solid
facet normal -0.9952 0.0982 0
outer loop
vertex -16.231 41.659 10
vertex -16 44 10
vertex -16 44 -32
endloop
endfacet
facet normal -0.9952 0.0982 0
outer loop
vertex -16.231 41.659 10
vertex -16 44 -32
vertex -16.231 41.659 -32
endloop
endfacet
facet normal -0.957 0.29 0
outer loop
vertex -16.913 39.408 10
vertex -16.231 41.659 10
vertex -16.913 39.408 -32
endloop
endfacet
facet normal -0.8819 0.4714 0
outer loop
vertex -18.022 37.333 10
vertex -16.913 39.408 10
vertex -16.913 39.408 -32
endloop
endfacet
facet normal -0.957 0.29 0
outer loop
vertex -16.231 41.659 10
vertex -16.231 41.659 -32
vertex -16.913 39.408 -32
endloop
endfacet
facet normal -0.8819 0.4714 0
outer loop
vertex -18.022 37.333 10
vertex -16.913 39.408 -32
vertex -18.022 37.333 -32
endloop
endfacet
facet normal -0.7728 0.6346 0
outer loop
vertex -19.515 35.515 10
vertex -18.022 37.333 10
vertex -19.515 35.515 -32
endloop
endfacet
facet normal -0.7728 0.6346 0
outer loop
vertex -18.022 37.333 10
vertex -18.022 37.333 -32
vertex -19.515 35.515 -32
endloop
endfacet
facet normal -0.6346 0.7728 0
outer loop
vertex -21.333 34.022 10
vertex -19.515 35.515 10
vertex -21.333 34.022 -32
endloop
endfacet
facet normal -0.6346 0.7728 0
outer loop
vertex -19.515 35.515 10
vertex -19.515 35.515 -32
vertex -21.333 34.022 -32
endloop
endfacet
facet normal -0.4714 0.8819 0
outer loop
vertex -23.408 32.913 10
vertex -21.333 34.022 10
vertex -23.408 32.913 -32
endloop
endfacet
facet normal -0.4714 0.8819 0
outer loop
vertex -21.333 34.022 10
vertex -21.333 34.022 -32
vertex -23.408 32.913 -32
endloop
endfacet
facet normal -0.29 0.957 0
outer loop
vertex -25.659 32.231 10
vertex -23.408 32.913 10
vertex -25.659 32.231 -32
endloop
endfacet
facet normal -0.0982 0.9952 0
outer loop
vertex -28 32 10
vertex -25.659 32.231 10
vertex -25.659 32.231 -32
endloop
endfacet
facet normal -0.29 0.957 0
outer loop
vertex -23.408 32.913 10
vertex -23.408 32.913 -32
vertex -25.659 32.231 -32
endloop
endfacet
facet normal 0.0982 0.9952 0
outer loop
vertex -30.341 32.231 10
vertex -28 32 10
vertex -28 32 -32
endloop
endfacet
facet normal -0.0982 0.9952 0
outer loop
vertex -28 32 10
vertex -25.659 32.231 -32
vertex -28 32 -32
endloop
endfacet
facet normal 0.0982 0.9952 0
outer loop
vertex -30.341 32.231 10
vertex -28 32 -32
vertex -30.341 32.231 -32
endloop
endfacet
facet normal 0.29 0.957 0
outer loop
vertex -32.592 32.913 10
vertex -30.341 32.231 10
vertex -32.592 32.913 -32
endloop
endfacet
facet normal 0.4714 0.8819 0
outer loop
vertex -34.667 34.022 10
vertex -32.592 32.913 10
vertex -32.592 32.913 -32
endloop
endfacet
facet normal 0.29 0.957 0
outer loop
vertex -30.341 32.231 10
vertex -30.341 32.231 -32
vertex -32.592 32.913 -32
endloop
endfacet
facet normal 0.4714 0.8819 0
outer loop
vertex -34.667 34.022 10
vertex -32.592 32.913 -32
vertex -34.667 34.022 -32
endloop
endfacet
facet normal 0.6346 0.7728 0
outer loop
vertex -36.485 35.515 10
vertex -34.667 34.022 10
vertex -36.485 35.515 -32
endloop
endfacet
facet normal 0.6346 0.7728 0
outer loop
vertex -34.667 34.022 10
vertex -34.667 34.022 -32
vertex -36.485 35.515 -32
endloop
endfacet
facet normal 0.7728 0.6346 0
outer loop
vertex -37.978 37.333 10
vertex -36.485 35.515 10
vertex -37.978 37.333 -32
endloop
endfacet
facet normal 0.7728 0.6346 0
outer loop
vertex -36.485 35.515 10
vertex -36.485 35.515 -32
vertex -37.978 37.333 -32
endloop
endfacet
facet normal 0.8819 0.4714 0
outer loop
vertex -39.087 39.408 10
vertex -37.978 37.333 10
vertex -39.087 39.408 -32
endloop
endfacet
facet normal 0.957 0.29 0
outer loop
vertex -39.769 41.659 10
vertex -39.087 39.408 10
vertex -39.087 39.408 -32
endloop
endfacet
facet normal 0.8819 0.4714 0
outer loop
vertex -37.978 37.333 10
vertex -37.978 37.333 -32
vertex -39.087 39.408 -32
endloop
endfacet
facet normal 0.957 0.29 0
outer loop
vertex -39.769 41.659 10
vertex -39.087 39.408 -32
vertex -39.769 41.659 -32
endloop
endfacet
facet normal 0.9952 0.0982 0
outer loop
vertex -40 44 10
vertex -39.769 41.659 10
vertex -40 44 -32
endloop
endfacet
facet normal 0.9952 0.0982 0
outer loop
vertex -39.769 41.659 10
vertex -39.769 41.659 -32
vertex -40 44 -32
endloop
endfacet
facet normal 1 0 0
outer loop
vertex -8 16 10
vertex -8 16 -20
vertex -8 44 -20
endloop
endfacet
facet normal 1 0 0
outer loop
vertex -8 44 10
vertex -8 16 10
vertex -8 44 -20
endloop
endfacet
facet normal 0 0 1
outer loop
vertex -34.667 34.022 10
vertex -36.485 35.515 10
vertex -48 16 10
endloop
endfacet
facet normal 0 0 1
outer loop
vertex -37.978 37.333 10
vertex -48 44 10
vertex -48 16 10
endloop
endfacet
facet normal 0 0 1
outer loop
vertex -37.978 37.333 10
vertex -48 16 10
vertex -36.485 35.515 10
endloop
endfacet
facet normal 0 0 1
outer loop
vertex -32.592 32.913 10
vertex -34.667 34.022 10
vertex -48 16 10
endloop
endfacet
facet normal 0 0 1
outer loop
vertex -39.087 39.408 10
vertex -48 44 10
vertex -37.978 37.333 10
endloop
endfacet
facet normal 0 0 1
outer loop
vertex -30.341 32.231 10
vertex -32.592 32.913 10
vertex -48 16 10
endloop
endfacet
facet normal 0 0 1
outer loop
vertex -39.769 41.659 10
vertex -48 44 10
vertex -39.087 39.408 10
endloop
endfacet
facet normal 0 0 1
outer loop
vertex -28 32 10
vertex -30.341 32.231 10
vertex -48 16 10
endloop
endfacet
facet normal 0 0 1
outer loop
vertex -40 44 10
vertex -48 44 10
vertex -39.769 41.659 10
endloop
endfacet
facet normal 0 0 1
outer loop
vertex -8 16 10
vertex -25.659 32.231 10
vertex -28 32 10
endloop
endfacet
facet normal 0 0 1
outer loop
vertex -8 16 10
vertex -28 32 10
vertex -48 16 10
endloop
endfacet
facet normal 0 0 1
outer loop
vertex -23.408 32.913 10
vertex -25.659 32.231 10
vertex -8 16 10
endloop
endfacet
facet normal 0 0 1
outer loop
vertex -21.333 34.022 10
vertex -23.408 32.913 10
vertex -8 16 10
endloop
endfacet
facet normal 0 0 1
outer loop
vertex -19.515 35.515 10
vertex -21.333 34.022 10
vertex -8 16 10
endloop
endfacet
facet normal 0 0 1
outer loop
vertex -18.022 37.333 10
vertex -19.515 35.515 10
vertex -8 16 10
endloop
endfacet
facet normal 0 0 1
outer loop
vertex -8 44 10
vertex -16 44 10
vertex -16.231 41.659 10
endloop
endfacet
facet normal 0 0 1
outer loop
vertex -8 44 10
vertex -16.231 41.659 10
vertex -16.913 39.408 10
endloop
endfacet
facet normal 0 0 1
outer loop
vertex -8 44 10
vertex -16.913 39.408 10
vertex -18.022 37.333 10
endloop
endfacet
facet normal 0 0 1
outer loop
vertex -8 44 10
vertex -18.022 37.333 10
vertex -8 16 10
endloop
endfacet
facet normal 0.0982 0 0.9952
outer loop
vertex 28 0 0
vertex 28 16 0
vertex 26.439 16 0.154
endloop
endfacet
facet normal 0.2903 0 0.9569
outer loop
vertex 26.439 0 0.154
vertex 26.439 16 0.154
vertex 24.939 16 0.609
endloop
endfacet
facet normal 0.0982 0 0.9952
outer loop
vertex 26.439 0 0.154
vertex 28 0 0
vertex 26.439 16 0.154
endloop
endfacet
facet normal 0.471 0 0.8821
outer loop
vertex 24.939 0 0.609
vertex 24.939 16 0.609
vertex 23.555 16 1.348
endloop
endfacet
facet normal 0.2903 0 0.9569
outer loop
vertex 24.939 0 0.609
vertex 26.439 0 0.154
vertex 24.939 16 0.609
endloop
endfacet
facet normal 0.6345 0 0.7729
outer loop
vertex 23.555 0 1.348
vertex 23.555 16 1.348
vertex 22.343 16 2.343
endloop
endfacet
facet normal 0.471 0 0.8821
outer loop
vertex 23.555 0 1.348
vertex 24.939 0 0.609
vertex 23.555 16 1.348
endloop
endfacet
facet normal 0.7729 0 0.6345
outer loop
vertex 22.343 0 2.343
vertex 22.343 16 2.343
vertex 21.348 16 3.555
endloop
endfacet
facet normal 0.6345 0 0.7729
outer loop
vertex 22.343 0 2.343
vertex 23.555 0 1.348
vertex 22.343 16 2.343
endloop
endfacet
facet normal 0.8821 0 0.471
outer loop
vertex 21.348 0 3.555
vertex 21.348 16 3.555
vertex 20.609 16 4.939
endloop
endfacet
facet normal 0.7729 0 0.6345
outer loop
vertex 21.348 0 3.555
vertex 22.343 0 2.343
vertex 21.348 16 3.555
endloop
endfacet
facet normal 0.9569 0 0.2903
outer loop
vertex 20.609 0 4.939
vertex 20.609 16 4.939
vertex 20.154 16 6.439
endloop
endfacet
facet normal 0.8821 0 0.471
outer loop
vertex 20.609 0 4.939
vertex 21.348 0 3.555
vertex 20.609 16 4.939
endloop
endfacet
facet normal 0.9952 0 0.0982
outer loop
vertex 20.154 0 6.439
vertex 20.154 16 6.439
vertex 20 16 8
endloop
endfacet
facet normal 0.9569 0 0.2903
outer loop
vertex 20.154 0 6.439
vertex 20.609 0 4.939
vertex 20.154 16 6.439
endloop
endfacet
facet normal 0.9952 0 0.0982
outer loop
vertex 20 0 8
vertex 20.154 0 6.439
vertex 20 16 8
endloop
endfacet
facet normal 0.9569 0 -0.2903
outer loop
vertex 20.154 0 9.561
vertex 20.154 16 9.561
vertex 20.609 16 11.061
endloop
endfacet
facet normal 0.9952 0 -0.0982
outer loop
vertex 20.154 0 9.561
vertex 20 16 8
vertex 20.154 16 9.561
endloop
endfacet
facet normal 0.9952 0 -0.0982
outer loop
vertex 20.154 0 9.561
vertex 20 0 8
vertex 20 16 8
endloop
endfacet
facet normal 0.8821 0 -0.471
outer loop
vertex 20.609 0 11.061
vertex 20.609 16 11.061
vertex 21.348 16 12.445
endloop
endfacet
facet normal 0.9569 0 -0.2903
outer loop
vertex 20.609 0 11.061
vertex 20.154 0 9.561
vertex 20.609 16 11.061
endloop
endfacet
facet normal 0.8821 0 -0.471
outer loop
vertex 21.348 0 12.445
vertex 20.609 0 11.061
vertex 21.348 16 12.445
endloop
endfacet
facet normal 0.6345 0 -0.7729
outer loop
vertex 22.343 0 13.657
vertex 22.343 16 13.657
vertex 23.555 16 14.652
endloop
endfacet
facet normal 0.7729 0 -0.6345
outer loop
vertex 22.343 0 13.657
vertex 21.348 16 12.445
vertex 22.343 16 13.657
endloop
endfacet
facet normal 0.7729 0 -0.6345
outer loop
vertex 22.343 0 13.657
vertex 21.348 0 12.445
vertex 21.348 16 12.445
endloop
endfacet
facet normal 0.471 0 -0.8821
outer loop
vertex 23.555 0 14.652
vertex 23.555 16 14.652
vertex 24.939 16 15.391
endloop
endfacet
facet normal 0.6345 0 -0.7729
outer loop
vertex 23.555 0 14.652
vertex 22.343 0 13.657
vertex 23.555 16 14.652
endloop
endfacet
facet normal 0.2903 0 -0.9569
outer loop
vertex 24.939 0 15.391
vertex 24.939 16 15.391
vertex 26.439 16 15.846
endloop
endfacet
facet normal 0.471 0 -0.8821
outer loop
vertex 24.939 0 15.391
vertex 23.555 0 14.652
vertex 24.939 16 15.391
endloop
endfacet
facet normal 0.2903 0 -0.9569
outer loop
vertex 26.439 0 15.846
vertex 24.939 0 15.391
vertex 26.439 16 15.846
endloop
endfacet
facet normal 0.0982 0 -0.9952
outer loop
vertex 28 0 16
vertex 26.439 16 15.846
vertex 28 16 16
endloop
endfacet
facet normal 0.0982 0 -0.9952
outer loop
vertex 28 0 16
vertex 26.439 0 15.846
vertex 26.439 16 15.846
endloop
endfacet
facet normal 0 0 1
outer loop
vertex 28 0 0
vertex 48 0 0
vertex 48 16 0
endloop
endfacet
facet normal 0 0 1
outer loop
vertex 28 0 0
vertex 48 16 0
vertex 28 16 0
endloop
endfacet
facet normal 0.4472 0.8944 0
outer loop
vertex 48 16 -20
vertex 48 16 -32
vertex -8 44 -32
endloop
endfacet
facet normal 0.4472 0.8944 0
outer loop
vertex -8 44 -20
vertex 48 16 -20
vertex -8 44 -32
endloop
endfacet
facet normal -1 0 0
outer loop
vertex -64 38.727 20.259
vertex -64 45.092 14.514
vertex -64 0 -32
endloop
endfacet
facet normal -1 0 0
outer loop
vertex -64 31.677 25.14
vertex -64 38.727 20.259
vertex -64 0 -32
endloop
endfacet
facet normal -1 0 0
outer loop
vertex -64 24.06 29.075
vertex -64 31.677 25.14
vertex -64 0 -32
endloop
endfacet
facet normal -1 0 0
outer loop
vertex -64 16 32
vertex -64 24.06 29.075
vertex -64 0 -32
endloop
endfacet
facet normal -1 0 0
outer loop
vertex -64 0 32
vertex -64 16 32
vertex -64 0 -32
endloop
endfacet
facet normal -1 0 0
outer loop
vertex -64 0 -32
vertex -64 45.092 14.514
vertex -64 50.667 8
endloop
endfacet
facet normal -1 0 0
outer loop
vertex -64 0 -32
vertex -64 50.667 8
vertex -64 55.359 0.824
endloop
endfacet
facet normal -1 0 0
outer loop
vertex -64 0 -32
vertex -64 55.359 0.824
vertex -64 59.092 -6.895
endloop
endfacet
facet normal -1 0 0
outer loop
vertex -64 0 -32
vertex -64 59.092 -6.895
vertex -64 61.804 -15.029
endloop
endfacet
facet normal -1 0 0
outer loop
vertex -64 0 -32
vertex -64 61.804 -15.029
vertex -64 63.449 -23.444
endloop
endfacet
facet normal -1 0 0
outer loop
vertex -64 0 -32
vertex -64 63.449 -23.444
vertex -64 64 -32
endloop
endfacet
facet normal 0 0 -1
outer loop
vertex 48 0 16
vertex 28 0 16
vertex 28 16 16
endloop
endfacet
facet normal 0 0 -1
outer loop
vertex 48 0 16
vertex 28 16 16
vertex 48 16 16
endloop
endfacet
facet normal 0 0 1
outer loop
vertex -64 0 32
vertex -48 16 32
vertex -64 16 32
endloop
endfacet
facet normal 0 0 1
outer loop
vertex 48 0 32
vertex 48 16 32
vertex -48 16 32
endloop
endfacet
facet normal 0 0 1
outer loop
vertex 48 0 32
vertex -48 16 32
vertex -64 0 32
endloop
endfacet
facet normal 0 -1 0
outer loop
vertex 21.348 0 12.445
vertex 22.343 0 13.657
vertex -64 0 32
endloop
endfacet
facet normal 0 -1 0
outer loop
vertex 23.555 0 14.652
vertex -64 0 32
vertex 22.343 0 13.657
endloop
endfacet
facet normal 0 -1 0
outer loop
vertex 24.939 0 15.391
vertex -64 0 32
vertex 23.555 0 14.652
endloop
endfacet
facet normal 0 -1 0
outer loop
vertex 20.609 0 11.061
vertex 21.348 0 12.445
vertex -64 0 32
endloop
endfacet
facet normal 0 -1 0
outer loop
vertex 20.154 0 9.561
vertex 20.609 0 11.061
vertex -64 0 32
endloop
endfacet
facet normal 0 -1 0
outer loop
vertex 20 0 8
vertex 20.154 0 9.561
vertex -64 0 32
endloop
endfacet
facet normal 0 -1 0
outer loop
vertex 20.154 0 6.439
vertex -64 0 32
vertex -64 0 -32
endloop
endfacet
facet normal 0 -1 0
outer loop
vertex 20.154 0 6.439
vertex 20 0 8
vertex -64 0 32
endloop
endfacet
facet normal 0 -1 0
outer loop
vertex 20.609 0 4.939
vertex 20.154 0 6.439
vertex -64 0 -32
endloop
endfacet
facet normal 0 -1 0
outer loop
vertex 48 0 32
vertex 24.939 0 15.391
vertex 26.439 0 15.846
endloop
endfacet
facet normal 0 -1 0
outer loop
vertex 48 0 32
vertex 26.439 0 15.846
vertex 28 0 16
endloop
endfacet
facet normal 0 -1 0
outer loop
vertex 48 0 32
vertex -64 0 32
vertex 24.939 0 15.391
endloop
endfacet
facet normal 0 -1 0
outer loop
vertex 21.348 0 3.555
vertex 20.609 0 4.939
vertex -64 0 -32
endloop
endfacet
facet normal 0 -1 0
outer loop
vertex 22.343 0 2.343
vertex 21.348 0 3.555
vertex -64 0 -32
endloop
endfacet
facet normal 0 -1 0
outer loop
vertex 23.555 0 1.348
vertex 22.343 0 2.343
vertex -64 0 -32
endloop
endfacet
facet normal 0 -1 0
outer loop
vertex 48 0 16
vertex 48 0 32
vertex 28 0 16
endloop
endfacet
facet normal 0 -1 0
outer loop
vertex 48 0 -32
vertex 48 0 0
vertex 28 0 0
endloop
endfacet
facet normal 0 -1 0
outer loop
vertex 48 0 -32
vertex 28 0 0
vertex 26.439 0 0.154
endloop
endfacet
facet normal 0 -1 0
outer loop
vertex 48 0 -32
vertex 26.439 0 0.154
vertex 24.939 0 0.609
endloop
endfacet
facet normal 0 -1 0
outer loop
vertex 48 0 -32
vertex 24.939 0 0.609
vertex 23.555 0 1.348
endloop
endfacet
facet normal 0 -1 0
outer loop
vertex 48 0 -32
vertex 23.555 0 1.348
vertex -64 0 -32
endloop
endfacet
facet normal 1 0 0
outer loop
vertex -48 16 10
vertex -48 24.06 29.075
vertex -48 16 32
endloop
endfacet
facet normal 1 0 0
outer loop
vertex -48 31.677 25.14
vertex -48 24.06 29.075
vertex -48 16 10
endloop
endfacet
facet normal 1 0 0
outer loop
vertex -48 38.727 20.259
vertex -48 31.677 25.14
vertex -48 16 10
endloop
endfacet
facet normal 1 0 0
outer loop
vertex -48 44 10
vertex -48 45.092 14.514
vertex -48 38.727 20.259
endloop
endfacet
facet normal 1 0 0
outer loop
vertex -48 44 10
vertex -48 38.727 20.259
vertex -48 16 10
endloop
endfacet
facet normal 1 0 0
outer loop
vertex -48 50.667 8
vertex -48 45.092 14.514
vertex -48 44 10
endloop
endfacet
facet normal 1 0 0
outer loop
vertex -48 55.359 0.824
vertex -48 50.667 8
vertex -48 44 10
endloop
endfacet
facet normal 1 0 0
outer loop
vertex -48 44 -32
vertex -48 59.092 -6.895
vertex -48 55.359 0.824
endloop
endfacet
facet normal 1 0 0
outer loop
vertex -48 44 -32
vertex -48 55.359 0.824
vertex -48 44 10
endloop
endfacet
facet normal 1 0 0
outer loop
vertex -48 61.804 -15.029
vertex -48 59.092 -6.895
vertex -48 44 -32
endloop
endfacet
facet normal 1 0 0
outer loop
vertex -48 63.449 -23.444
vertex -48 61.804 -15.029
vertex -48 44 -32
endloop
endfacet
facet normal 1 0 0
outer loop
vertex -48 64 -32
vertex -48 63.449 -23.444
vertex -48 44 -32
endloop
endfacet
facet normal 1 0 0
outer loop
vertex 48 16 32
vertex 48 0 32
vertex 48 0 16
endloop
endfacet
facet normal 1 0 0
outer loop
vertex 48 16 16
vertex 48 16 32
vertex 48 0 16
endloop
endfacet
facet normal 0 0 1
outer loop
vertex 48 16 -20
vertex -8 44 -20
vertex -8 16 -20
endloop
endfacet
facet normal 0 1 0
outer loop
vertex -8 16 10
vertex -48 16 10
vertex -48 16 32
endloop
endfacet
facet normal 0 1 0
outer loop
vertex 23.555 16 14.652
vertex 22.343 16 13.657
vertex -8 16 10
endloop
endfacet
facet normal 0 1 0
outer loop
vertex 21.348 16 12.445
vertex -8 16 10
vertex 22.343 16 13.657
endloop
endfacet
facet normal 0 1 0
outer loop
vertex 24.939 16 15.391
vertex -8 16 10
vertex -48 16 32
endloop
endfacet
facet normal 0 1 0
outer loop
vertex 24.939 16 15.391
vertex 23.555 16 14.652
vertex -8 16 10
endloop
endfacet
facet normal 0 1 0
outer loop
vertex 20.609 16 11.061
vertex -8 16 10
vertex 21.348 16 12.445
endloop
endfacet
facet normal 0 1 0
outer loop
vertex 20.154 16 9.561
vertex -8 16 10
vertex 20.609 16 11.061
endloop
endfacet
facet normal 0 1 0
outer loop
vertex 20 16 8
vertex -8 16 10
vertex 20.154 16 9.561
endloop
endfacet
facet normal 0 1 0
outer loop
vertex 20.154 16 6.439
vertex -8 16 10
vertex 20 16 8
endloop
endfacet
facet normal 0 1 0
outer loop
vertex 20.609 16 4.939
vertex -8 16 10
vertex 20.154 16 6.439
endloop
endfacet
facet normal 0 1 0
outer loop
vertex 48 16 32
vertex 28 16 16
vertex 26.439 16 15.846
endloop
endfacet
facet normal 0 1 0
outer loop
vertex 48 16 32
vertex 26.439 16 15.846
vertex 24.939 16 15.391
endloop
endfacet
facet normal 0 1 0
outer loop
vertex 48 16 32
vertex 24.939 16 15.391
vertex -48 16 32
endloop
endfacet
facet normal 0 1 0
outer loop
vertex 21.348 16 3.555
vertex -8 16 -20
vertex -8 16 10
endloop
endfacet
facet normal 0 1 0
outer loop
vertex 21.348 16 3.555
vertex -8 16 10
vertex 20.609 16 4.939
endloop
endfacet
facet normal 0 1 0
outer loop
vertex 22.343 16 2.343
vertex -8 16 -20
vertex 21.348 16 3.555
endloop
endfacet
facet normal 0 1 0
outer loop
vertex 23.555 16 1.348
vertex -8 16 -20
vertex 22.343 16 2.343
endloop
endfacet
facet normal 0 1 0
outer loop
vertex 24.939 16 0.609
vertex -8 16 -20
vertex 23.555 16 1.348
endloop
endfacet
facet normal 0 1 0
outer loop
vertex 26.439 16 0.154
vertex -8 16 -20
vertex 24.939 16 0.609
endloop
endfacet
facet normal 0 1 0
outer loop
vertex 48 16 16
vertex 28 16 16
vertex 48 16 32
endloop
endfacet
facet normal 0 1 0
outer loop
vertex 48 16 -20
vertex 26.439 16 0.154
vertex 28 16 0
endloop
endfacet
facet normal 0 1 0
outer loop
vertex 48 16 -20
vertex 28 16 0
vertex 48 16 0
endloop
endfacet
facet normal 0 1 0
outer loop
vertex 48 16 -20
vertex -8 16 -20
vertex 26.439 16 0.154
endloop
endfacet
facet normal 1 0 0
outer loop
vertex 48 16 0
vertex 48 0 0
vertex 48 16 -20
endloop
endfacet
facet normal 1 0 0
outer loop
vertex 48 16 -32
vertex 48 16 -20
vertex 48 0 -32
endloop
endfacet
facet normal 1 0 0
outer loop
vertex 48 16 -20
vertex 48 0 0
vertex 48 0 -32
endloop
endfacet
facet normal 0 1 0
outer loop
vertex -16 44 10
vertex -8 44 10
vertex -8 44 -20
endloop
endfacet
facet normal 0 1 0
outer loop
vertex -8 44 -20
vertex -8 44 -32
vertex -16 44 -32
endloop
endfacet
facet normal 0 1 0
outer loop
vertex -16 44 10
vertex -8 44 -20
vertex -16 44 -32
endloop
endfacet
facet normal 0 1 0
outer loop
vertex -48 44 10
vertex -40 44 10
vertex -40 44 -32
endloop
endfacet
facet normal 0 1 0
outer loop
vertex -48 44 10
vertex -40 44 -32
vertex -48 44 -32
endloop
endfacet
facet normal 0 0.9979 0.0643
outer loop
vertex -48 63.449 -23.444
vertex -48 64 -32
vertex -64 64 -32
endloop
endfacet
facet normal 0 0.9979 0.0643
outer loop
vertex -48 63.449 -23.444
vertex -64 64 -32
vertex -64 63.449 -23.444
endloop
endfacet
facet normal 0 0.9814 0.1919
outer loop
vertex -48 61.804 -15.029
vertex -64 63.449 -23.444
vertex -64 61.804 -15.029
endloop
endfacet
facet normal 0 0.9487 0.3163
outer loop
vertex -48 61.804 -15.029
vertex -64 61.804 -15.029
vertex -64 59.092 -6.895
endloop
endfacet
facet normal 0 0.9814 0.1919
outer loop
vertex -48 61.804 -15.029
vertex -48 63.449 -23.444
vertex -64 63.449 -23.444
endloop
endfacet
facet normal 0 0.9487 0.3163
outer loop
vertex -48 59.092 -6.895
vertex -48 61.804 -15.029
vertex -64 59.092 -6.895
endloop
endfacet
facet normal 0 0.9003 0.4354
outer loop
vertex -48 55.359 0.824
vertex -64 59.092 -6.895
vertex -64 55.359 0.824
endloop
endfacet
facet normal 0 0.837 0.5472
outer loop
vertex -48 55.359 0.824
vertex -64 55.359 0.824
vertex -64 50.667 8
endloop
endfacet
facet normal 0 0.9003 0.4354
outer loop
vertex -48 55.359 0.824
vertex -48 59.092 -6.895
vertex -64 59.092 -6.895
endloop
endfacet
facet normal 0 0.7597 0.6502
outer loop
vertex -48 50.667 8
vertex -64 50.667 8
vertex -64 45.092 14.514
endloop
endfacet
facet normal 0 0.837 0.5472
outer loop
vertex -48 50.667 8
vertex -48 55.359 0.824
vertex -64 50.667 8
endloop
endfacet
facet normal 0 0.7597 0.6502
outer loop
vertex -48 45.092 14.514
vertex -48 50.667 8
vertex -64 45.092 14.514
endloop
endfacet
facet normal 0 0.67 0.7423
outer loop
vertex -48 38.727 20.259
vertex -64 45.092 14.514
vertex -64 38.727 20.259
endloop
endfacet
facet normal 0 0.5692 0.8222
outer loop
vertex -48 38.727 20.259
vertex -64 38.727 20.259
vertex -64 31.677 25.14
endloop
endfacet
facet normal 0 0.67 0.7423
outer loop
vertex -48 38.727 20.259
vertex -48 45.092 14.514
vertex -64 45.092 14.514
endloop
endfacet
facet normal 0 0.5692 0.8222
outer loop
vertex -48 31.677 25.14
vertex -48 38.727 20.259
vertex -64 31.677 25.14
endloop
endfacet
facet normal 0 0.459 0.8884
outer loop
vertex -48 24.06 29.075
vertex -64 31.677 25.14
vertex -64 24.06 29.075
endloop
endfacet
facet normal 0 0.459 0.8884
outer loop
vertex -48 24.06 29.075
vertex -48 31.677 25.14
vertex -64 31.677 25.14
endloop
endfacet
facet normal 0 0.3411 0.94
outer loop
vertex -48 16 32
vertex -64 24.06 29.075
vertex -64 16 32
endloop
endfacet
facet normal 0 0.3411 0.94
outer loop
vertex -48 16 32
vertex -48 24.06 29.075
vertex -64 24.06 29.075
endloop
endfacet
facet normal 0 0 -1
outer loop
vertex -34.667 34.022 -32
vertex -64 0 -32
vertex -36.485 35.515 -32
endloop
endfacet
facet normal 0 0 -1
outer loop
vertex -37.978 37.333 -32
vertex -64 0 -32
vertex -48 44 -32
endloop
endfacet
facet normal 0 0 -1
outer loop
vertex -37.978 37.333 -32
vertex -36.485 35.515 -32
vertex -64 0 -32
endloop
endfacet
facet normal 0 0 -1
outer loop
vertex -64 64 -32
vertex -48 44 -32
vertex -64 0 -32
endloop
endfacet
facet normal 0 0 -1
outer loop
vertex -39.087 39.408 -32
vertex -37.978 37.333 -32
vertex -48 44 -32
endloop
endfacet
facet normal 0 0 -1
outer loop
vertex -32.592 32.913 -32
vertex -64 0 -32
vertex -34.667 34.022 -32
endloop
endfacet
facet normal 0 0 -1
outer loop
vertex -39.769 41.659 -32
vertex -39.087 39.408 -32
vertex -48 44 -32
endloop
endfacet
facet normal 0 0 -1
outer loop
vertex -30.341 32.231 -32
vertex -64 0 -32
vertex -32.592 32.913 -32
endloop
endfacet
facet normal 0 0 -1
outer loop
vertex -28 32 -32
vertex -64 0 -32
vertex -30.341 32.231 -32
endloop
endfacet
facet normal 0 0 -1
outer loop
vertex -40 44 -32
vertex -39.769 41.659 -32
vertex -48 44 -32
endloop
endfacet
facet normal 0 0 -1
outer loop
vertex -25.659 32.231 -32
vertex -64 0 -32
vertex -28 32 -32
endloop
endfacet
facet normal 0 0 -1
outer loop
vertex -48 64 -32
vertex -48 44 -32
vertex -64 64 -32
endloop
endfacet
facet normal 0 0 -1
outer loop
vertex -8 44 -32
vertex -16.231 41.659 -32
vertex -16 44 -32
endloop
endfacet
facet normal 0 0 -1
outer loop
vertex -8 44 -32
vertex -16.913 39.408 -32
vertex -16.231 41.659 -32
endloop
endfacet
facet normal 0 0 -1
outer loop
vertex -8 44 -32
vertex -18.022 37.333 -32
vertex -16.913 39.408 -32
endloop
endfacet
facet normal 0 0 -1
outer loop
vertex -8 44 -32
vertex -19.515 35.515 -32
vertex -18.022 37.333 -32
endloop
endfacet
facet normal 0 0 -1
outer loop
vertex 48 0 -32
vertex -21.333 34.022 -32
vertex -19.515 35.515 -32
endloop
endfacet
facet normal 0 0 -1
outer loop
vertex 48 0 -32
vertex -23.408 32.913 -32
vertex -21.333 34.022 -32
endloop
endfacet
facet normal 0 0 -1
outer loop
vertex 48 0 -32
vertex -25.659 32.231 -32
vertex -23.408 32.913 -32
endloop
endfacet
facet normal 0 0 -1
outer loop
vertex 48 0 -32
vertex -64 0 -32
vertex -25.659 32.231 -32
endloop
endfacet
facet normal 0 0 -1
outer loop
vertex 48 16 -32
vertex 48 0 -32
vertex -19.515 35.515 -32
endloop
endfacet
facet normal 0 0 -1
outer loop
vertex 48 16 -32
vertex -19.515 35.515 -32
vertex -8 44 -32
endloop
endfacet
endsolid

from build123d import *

# Parameters (mm, degrees)
SKETCH1_W               = 96
SKETCH1_H               = 64
BOSS_EXTRUDE1_DEPTH     = 16
CUT_EXTRUDE1_DEPTH      = 60.866518188
CUT_EXTRUDE1_DEPTH_BACK = 16
BOSS_EXTRUDE3_DEPTH     = 12
BOSS_EXTRUDE4_DEPTH     = 42
BOSS_EXTRUDE6_DEPTH     = 16


with BuildPart() as part:
    # Sketch1 → Boss-Extrude1 (new body)
    with BuildSketch(Plane(origin=(0, 0, 0), x_dir=(1, 0, 0), z_dir=(0, 1, 0))):
        Rectangle(SKETCH1_W, SKETCH1_H)
    extrude(amount=BOSS_EXTRUDE1_DEPTH)

    # Sketch2 → Cut-Extrude1 (cut, two sides: drawn at the far end of the back side and taken through both)
    with BuildSketch(Plane(origin=(0, 16, 0), x_dir=(1, 0, 0), z_dir=(0, 1, 0)).offset(-CUT_EXTRUDE1_DEPTH_BACK)):
        with BuildLine():
            Line((28, -16), (48, -16))
            Line((48, -16), (48, 0))
            Line((48, 0), (28, 0))
            ThreePointArc((28, 0), (20, -8), (28, -16))
        make_face()
    extrude(amount=CUT_EXTRUDE1_DEPTH + CUT_EXTRUDE1_DEPTH_BACK, mode=Mode.SUBTRACT)

    # Sketch3 → Boss-Extrude3 (add)
    with BuildSketch(Plane(origin=(0, 0, -32), x_dir=(-1, 0, 0), z_dir=(0, 0, -1))):
        Polygon((-48, 16), (8, 44), (8, 16), align=None)
    extrude(amount=-BOSS_EXTRUDE3_DEPTH)

    # Sketch4 → Boss-Extrude4 (add)
    with BuildSketch(Plane(origin=(0, 0, -32), x_dir=(-1, 0, 0), z_dir=(0, 0, -1))):
        with BuildLine():
            Line((8, 44), (16, 44))
            ThreePointArc((16, 44), (28, 32), (40, 44))
            Line((40, 44), (48, 44))
            Line((48, 44), (48, 16))
            Line((48, 16), (8, 16))
            Line((8, 16), (8, 44))
        make_face()
    extrude(amount=-BOSS_EXTRUDE4_DEPTH)

    # Sketch6 → Boss-Extrude6 (add)
    with BuildSketch(Plane.ZY.offset(48)):
        with BuildLine():
            Line((-32, 0), (-32, 64))
            ThreePointArc((-32, 64), (8, 50.666666667), (32, 16))
            Line((32, 16), (32, 0))
            Line((32, 0), (-32, 0))
        make_face()
    extrude(amount=BOSS_EXTRUDE6_DEPTH)


solid = part.part
